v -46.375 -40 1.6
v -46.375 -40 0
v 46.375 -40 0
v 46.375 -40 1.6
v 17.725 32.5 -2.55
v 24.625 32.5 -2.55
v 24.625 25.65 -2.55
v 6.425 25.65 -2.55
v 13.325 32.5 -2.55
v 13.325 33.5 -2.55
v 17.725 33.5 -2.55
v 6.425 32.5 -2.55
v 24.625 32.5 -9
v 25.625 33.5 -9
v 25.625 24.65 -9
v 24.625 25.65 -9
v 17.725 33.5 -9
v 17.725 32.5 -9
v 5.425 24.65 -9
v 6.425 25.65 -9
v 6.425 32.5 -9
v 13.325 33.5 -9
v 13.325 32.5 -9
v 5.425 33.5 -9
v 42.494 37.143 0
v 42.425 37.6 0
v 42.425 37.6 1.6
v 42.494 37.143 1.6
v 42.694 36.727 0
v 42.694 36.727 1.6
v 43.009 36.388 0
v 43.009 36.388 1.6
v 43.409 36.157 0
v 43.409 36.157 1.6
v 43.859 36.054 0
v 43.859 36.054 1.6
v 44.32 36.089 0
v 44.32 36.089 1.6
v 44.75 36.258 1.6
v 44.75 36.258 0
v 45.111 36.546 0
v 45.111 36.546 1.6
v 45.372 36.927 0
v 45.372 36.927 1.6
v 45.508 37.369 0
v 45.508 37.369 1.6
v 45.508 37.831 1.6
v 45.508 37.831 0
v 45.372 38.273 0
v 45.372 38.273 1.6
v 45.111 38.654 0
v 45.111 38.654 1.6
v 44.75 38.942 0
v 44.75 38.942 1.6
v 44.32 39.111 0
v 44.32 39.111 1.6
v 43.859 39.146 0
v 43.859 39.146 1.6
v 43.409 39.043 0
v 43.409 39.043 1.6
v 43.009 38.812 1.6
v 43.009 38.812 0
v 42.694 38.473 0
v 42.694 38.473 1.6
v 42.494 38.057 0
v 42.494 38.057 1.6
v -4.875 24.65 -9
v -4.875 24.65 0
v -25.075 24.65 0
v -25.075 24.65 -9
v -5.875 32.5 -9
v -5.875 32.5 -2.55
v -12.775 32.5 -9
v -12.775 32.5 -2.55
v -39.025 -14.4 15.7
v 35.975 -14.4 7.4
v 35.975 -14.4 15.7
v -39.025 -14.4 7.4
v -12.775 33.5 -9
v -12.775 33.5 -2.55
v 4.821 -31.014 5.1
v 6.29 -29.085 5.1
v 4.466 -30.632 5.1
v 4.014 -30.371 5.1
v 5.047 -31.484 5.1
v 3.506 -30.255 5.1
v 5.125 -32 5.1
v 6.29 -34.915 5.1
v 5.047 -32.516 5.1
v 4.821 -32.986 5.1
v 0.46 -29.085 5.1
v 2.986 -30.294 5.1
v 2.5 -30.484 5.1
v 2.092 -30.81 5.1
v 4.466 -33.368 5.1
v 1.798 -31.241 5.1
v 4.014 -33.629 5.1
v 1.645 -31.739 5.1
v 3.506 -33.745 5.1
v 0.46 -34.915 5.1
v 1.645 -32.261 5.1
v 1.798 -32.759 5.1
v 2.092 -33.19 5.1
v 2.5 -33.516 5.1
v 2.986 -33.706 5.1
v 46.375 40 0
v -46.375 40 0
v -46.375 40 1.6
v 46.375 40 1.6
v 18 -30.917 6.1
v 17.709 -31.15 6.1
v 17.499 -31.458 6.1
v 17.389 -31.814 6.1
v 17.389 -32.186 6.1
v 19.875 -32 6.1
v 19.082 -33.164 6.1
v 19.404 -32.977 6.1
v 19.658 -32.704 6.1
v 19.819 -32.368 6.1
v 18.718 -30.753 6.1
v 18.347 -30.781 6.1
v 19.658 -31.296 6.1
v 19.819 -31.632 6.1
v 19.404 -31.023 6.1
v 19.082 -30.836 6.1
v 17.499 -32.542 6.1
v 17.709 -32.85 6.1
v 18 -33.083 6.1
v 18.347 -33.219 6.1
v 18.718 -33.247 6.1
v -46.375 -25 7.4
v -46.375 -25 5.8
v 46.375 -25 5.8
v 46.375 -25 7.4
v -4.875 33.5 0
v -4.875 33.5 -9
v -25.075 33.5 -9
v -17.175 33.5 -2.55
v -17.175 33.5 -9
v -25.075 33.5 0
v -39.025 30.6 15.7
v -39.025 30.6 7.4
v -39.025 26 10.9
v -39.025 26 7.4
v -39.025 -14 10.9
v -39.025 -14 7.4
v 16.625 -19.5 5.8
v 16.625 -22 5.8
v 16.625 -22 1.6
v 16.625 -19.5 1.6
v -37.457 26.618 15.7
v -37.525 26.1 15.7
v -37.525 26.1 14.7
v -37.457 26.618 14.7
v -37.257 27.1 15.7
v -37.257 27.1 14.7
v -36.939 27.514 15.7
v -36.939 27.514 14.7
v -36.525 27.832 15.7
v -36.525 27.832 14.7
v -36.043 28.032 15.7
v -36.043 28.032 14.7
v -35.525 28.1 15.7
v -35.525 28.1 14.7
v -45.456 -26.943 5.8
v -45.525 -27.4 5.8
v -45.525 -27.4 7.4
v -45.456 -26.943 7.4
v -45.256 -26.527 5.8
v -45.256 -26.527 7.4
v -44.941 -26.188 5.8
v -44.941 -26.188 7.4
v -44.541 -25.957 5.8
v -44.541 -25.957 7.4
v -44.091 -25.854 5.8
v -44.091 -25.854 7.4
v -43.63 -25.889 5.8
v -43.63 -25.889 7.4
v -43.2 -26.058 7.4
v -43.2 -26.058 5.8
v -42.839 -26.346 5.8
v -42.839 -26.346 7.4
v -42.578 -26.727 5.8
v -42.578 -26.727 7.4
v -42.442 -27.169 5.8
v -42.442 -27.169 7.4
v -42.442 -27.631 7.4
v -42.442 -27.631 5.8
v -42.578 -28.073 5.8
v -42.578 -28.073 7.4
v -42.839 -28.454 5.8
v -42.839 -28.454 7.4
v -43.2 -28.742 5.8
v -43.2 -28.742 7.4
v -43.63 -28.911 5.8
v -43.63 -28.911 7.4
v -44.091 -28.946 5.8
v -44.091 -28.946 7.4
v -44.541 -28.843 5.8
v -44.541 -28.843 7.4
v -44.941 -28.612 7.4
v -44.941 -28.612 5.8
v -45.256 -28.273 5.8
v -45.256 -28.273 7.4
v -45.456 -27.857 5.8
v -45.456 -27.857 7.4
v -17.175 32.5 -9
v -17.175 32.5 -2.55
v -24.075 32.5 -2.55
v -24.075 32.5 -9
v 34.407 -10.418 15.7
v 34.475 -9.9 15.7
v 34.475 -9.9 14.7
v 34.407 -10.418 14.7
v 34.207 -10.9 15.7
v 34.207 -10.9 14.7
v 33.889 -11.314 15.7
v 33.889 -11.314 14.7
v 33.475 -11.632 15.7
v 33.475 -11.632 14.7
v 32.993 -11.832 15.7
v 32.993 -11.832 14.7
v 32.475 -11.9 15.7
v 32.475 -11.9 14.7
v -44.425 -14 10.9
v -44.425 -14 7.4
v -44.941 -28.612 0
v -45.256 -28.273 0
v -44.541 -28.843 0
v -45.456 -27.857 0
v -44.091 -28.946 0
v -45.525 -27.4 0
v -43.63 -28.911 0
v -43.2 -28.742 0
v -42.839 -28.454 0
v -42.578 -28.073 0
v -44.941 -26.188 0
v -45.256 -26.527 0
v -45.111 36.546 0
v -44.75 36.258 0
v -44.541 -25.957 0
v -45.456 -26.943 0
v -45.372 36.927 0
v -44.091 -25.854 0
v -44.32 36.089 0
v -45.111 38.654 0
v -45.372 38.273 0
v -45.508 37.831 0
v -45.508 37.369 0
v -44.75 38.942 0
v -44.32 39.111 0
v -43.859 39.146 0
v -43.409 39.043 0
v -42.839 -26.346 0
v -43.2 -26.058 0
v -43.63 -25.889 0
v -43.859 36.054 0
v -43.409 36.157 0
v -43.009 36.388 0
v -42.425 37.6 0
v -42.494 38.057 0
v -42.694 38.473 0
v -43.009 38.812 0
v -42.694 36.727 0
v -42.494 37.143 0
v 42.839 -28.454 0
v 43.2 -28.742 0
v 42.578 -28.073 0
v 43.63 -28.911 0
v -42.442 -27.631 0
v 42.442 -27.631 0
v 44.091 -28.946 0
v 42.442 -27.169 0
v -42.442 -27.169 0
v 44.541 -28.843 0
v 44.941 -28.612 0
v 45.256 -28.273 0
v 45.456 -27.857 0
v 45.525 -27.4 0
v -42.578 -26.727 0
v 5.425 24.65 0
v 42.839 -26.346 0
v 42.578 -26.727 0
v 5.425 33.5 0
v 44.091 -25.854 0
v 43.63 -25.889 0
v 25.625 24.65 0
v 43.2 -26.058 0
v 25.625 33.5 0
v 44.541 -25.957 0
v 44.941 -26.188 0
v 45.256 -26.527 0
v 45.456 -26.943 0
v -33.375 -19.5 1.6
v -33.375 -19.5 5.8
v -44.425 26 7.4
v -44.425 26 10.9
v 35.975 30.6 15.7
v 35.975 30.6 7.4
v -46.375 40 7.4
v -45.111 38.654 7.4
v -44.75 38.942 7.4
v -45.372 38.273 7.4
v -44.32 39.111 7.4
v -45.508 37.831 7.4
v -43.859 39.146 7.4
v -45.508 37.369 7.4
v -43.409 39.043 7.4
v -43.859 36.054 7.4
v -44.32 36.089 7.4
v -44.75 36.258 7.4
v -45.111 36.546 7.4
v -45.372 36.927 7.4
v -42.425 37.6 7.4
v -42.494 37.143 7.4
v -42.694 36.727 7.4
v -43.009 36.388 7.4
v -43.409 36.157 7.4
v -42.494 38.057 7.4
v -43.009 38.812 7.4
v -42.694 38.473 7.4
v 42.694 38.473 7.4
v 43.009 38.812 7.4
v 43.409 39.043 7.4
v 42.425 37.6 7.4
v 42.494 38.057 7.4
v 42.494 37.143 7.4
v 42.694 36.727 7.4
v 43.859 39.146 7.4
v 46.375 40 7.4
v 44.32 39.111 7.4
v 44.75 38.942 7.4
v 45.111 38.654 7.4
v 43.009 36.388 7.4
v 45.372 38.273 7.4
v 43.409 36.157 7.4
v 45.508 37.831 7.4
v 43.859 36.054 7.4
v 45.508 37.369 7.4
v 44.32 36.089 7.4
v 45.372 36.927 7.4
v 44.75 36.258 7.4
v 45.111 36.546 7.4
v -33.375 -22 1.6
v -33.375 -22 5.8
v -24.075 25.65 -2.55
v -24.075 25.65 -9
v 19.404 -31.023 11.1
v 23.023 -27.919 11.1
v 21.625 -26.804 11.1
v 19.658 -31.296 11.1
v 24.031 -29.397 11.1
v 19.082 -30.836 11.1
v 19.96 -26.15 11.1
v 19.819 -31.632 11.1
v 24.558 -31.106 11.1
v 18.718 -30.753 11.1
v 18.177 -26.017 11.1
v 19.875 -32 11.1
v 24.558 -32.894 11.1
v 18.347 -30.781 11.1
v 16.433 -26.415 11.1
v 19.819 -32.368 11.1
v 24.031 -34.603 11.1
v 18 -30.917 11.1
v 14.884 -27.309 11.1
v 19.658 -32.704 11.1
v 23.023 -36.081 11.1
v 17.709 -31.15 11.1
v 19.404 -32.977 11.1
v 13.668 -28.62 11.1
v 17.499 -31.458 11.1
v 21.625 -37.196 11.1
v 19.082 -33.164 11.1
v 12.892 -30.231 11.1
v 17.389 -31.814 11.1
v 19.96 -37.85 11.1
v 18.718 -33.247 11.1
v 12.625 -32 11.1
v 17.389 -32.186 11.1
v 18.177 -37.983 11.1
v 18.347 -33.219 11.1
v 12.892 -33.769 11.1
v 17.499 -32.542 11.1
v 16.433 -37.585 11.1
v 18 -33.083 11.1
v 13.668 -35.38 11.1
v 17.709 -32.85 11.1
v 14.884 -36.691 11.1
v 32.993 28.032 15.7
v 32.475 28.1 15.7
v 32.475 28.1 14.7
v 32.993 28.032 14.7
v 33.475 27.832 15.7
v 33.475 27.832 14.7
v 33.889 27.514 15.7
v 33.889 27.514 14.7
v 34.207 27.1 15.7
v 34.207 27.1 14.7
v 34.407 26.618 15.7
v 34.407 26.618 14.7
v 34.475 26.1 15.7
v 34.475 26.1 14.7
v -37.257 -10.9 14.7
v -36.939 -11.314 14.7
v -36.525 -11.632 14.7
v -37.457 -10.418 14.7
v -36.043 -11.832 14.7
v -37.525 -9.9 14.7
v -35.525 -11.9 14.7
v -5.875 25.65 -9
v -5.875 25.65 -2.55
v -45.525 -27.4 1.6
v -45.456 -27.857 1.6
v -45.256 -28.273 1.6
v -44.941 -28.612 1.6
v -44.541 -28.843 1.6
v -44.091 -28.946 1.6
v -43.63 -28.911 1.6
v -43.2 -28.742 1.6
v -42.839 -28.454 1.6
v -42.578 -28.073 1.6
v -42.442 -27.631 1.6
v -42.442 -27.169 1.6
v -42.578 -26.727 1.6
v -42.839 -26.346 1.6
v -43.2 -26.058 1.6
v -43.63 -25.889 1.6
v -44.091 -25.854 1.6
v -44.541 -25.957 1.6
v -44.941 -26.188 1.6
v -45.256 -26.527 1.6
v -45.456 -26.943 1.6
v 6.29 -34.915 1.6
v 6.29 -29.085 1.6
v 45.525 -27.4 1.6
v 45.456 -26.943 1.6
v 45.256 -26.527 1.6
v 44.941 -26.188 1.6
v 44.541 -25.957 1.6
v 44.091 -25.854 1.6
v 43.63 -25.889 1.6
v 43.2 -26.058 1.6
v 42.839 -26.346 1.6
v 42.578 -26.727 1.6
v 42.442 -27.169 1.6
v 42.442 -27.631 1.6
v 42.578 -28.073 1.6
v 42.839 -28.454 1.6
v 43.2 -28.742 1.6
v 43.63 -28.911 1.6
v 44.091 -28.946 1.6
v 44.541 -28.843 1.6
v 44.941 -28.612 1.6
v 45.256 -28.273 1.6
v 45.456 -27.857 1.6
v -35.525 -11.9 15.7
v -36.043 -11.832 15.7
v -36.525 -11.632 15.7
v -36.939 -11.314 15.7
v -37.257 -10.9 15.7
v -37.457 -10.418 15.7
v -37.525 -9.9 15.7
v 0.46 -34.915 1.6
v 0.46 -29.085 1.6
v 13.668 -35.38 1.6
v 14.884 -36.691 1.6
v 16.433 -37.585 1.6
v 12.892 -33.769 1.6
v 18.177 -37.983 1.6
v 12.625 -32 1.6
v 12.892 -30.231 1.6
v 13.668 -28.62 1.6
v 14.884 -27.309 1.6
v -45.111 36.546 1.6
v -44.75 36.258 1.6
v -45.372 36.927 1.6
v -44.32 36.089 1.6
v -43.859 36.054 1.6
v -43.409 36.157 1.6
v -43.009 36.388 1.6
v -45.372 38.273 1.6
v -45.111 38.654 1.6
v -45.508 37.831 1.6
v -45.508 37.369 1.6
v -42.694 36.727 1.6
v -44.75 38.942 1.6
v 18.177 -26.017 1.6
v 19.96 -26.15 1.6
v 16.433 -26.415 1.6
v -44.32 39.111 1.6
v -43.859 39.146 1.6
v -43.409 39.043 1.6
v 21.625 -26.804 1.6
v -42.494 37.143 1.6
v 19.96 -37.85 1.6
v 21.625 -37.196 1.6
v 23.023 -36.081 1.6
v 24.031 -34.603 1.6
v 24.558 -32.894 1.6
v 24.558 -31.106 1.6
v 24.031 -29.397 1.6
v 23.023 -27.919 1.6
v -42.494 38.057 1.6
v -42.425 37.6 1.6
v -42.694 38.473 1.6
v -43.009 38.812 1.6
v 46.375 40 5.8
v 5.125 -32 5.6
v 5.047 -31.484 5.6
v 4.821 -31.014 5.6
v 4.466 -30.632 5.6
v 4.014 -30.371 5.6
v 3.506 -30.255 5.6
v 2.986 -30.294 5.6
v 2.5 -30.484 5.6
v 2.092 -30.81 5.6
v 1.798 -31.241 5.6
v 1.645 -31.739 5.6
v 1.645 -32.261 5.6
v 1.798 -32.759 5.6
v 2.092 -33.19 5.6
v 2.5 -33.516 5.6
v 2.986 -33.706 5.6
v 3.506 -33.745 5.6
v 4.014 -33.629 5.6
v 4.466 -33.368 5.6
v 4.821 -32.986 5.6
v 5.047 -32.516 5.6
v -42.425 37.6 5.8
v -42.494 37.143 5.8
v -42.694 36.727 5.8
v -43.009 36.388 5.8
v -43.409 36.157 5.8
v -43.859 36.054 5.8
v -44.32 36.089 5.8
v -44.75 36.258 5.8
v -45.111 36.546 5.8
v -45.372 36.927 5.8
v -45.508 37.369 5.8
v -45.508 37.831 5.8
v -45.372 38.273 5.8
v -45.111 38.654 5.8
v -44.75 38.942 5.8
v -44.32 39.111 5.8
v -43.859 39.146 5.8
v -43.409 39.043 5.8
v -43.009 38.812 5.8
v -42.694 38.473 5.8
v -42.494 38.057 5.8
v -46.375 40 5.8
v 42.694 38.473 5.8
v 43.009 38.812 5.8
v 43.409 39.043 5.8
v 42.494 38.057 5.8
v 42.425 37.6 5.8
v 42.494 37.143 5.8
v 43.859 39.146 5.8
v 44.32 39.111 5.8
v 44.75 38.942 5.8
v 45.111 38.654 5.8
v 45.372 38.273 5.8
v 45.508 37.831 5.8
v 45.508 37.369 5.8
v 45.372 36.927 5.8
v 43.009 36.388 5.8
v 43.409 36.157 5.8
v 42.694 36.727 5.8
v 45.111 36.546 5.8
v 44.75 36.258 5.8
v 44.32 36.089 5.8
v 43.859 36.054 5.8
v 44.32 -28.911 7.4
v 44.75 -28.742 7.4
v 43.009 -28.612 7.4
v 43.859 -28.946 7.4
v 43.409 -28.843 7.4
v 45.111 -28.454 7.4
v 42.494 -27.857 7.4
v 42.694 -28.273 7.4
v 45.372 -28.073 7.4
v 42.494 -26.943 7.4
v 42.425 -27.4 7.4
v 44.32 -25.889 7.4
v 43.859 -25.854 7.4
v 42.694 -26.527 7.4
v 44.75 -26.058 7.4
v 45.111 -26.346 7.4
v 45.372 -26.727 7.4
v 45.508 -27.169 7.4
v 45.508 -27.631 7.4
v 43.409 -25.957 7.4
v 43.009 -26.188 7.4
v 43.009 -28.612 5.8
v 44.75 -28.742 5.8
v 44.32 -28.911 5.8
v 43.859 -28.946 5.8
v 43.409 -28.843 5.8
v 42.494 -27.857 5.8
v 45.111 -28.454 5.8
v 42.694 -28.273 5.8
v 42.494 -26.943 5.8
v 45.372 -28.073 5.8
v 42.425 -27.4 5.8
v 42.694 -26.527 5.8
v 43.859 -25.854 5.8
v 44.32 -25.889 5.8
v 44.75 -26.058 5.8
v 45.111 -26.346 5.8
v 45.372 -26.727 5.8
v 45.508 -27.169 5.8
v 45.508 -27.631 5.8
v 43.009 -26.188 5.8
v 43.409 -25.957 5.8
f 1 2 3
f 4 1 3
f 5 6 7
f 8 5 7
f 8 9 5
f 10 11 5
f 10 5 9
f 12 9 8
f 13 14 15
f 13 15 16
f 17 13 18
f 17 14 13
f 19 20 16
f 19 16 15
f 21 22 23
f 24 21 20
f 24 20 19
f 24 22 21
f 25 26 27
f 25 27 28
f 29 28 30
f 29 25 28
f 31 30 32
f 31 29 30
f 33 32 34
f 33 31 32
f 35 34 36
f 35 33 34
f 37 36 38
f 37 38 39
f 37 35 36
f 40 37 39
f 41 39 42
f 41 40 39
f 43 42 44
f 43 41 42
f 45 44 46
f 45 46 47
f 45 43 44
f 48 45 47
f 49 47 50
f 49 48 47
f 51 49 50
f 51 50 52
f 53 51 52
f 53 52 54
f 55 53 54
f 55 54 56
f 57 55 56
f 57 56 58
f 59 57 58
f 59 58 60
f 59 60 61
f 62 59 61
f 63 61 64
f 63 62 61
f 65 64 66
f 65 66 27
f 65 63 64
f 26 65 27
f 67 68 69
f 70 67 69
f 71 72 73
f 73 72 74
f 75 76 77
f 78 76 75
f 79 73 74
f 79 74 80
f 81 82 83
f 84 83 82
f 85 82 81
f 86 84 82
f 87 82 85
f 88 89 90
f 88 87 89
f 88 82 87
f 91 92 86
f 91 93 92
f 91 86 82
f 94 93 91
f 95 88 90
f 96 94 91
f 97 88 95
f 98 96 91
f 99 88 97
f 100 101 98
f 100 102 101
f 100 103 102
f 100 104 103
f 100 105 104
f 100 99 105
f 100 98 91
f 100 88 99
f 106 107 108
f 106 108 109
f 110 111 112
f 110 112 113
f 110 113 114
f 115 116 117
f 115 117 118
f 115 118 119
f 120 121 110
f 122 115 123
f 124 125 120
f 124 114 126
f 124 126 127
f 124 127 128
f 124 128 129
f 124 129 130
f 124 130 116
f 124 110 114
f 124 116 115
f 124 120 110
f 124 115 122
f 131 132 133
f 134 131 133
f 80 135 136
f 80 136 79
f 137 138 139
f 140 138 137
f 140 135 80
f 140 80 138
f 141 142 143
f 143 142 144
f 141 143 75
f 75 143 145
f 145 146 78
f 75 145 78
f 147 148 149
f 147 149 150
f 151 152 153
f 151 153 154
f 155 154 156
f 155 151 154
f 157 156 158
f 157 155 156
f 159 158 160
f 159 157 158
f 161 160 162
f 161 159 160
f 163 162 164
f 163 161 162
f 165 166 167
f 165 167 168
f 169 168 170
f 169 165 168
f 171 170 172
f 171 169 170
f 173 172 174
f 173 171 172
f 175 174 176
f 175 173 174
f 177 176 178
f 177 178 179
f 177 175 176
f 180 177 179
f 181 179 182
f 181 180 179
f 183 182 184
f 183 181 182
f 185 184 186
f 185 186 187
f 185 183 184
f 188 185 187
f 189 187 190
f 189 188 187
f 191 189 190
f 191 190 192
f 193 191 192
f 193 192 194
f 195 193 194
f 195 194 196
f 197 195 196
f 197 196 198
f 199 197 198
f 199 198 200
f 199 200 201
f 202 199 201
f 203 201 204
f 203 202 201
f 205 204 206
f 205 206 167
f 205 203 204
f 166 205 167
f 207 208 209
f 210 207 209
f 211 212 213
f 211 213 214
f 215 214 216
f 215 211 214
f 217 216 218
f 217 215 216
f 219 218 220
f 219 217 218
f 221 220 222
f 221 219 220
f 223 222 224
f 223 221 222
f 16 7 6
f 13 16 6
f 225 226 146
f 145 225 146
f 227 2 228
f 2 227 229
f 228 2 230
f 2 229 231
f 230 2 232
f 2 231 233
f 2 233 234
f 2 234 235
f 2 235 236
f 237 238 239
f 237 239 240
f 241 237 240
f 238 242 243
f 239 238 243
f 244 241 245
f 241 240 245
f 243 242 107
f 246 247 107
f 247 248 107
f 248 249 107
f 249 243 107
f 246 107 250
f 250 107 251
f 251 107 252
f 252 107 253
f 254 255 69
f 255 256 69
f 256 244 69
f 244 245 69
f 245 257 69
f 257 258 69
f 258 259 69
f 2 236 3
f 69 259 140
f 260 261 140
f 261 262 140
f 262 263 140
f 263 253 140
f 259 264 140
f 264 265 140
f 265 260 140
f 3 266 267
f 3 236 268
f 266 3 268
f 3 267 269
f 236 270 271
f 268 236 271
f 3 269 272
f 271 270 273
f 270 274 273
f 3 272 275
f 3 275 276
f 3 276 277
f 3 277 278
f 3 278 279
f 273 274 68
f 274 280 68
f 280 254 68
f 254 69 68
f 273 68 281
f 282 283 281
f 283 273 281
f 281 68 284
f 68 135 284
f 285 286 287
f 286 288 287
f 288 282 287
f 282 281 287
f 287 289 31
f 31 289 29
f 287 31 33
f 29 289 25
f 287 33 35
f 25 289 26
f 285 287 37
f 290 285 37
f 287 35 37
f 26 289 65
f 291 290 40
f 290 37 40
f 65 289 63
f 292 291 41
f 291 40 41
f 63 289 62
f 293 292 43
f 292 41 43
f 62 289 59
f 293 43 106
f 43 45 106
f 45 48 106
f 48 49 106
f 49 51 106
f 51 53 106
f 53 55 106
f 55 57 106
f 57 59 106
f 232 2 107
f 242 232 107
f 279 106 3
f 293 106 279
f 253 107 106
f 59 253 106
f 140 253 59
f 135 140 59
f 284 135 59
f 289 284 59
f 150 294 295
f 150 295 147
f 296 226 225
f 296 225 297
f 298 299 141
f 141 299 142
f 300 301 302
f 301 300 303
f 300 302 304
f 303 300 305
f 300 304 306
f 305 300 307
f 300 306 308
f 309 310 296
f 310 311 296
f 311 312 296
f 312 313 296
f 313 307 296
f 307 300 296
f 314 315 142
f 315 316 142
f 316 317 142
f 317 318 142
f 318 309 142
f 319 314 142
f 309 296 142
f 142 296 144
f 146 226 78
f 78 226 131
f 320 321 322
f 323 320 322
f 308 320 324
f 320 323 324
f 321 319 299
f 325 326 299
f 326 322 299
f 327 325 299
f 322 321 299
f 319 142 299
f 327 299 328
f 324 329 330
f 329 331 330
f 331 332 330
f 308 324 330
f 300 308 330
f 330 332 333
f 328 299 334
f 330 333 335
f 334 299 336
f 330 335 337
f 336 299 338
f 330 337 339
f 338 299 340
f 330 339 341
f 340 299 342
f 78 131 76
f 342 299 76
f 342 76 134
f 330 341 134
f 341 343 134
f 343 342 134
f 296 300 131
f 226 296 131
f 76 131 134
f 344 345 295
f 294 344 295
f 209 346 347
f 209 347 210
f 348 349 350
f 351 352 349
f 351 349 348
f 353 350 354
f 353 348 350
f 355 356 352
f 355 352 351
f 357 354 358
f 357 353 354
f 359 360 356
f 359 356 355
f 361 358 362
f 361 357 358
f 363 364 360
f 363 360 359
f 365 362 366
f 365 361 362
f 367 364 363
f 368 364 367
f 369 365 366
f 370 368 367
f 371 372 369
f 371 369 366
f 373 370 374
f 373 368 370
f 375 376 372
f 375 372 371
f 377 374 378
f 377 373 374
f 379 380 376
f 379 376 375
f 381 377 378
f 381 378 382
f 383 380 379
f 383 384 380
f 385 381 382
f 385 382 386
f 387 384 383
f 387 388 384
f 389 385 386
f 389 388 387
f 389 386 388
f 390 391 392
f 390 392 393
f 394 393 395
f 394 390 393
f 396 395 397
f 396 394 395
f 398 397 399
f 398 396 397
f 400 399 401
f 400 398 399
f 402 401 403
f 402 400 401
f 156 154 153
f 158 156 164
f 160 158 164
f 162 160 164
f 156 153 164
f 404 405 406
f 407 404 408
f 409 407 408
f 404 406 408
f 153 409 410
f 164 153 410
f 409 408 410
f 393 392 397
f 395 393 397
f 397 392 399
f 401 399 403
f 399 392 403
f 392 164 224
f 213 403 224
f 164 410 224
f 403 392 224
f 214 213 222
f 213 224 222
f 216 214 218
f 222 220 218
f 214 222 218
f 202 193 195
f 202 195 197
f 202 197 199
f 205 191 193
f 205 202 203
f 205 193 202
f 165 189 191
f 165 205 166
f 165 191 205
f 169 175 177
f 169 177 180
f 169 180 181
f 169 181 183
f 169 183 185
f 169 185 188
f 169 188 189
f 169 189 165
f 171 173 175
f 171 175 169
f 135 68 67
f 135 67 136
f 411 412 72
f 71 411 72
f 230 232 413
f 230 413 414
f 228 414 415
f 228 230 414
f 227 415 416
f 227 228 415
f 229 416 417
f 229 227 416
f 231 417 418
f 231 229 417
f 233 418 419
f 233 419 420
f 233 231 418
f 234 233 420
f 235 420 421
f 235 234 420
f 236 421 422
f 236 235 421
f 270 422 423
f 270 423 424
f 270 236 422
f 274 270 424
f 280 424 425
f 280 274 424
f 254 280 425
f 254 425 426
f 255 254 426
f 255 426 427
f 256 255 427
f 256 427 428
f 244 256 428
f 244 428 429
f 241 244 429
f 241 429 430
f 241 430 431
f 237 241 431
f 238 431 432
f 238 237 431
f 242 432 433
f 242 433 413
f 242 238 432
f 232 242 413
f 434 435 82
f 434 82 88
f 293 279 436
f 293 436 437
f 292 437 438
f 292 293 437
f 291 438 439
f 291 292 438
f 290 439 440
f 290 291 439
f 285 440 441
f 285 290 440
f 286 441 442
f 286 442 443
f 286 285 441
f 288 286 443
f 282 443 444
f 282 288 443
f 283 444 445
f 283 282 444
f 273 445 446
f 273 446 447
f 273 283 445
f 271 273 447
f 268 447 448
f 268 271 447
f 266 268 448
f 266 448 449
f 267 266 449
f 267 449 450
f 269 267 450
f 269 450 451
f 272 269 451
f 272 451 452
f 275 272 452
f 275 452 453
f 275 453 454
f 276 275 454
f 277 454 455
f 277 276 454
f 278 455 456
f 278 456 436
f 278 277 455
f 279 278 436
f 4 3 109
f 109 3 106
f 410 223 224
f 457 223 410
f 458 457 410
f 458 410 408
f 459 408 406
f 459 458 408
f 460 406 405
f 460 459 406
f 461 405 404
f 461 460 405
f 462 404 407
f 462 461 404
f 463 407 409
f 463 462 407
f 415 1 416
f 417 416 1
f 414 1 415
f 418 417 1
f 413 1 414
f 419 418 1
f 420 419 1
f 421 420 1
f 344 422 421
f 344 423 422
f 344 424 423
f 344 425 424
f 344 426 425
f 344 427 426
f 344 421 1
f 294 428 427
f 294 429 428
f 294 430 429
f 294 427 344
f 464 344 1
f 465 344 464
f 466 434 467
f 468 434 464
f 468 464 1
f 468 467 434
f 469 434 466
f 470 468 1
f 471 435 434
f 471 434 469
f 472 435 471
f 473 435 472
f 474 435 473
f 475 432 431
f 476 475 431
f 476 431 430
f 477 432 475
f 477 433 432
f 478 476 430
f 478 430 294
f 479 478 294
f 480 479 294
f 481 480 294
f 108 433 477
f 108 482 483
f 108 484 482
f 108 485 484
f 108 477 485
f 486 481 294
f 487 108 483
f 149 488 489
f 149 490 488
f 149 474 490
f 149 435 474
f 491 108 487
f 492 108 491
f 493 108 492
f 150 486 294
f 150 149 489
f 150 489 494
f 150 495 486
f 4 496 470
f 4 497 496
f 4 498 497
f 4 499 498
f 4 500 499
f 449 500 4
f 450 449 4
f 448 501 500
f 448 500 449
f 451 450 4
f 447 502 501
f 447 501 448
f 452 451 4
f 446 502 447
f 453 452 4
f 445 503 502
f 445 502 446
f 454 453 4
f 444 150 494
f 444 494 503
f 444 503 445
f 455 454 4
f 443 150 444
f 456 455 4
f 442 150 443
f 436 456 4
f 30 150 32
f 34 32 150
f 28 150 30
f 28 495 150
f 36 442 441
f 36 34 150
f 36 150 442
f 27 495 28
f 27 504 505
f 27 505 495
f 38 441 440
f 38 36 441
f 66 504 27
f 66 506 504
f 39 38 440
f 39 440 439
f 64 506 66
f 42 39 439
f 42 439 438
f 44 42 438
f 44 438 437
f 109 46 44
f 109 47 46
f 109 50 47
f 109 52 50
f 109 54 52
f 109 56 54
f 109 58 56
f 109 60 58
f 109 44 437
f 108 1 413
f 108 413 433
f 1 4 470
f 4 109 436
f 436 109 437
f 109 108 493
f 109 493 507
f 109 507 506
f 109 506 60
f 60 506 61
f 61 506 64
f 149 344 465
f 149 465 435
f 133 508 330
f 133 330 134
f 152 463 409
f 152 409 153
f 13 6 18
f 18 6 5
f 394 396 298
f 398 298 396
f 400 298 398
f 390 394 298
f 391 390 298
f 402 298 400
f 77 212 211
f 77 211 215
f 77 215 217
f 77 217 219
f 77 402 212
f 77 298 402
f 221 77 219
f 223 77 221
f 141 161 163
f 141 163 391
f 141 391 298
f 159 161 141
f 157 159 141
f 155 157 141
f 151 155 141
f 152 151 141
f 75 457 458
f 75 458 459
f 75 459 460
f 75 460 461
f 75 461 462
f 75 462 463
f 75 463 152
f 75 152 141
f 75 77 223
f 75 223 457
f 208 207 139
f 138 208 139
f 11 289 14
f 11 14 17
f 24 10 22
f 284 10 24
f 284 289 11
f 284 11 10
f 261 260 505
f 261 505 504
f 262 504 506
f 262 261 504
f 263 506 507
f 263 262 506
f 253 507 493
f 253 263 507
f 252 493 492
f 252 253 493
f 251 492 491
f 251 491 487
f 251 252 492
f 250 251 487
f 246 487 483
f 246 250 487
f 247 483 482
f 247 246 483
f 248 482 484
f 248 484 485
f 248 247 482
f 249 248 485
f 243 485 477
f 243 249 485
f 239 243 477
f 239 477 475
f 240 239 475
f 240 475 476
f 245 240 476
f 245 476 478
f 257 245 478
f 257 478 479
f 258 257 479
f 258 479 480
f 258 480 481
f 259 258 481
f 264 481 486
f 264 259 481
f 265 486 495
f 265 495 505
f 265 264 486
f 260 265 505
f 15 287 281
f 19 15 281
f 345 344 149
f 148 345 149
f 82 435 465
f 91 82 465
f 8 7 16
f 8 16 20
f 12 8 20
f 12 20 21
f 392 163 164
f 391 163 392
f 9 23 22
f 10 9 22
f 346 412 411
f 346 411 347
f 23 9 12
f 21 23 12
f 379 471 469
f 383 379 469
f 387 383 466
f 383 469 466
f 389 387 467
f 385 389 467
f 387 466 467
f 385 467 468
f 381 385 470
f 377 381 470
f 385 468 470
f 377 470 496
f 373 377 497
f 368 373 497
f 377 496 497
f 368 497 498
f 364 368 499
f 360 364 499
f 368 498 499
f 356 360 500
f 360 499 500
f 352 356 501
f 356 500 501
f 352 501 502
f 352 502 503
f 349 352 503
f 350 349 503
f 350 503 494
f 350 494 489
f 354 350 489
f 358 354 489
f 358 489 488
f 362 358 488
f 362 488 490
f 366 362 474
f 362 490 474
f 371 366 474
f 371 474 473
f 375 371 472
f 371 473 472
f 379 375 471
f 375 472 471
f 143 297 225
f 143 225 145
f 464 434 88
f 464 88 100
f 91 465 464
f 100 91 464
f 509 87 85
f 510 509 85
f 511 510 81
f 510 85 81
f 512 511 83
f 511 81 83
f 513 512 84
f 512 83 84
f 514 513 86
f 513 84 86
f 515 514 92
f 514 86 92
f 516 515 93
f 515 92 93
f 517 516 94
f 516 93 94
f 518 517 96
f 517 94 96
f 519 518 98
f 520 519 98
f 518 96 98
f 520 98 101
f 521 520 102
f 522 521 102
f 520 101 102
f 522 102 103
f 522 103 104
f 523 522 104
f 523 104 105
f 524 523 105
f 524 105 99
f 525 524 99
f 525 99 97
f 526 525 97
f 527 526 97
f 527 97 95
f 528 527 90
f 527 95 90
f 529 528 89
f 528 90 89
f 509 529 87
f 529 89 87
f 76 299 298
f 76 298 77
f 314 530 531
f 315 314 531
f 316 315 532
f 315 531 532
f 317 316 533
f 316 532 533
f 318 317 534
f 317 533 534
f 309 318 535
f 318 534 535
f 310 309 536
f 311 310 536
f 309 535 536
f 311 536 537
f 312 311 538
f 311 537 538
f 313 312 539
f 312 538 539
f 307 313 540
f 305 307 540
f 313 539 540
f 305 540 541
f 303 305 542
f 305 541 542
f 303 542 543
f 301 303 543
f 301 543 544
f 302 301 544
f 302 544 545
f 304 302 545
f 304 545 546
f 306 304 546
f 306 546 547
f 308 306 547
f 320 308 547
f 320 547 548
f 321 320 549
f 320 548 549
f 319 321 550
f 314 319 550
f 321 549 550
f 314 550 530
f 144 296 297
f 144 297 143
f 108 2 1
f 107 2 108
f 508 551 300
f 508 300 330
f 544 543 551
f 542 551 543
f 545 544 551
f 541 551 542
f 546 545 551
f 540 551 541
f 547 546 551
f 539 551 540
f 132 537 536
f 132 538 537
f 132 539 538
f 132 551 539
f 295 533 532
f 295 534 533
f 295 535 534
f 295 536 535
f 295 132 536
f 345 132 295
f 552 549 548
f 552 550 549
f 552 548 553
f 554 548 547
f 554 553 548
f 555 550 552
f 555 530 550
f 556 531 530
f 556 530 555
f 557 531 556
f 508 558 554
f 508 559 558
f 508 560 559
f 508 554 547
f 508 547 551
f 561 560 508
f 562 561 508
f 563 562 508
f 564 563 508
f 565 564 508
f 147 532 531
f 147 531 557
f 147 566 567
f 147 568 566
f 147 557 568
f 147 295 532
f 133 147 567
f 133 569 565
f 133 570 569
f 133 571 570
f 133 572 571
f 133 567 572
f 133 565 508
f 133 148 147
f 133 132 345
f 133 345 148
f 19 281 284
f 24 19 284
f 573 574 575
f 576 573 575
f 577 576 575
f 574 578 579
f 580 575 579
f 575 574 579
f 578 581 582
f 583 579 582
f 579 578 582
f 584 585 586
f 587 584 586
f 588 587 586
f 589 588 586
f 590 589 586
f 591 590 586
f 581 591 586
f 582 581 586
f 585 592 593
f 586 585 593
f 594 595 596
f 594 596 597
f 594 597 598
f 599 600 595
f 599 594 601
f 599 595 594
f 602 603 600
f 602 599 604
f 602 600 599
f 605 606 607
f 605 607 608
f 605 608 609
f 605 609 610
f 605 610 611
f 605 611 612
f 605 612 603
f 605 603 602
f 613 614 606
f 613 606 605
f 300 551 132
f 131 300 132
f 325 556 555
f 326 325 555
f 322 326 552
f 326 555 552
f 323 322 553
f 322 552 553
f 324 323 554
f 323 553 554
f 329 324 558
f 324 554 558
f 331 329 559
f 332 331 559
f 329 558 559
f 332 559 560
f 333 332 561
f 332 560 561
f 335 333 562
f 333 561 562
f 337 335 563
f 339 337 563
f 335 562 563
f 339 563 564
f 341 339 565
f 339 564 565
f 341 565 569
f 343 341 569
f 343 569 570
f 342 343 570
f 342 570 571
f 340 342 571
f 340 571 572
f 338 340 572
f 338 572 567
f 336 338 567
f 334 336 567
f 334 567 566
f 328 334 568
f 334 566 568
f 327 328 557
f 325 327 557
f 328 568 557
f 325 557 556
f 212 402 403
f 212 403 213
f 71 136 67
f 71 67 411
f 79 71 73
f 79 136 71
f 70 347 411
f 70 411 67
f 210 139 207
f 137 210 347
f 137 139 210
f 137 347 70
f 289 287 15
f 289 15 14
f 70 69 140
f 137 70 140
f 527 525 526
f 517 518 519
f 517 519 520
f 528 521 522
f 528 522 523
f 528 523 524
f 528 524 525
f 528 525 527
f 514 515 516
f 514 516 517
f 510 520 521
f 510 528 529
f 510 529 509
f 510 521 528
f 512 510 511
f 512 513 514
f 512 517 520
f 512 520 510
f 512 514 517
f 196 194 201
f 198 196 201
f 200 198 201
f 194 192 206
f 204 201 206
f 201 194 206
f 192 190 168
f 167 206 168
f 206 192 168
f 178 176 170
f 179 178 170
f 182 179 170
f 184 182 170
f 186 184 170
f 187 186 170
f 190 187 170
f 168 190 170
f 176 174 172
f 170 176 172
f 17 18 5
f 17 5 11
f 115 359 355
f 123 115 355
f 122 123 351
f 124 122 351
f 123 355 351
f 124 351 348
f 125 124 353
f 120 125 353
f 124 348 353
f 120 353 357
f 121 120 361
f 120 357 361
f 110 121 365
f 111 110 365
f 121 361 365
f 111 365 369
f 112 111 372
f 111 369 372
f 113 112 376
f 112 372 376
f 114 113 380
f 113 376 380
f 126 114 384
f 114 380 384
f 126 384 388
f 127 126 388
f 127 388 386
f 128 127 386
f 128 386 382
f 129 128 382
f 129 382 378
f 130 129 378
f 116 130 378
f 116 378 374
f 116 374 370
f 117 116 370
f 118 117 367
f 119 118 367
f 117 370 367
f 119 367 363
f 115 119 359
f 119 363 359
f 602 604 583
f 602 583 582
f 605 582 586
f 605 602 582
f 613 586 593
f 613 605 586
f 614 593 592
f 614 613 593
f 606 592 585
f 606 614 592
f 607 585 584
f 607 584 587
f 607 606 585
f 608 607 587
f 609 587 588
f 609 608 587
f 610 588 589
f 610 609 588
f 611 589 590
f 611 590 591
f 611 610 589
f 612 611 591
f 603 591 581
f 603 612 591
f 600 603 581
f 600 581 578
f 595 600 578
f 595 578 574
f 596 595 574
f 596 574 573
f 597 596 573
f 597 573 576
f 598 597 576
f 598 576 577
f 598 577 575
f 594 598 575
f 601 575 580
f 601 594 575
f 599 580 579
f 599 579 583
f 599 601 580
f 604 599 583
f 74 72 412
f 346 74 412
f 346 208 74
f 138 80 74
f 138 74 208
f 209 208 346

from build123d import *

# Parameters (mm, degrees)
SKETCH1_W                             = 92.75
SKETCH1_H                             = 80
SKETCH1_R                             = 1.55
BOSS_EXTRUDE1_FIRST_PCB_DEPTH         = 1.6
SKETCH2_R                             = 6
BOSS_EXTRUDE2_SPEAKER_DEPTH           = 9.5
SKETCH15_R                            = 1.25
CUT_EXTRUDE1_SPEAKER_HOLE_DEPTH       = 5
SKETCH4_W                             = 5.83
SKETCH4_H                             = 5.83
BOSS_EXTRUDE4_RESET_SWITCH_DEPTH      = 3.5
SKETCH5_R                             = 1.75
BOSS_EXTRUDE5_RESET_BUTTON_DEPTH      = 0.5
SKETCH19_W                            = 50
SKETCH19_H                            = 2.5
BOSS_EXTRUDE10_CONNECTOR_DEPTH        = 4.2
SKETCH11_R                            = 1.55
SKETCH11_W                            = 92.75
SKETCH11_H                            = 65
BOSS_EXTRUDE11_UPPER_PCB_DEPTH        = 1.6
SKETCH12_W                            = 75
SKETCH12_H                            = 45
BOSS_EXTRUDE12_LCD_DEPTH              = 8.3
SKETCH24_W                            = 5.4
SKETCH24_H                            = 40
BOSS_EXTRUDE13_LCD_BUMPOUT_DEPTH      = 3.5
CUT_EXTRUDE2_SCREEN_RECESS_DEPTH      = 1
SKETCH21_W                            = 20.2
SKETCH21_H                            = 8.85
SKETCH21_W_2                          = 18.2
SKETCH21_H_2                          = 6.85
BOSS_EXTRUDE14_CONNECTORS_DEPTH       = 9
SKETCH22_W                            = 18.2
SKETCH22_H                            = 6.85
BOSS_EXTRUDE15_CONNECTOR_RECESS_DEPTH = 2.55
SKETCH23_W                            = 4.4
SKETCH23_H                            = 1
CUT_EXTRUDE3_CONNECTOR_NOTCH_DEPTH    = 6.45


with BuildPart() as part:
    # Sketch1 → Boss-Extrude1 - First PCB (new body)
    with BuildSketch(Plane.XY):
        Rectangle(SKETCH1_W, SKETCH1_H)
        with Locations((-43.975, 37.6)):
            Circle(SKETCH1_R, mode=Mode.SUBTRACT)
        with Locations(Location((43.975, 37.6, 0), (0, 0, 180))):
            Circle(SKETCH1_R, mode=Mode.SUBTRACT)
        with Locations((43.975, -27.4)):
            Circle(SKETCH1_R, mode=Mode.SUBTRACT)
        with Locations(Location((-43.975, -27.4, 0), (0, 0, 180))):
            Circle(SKETCH1_R, mode=Mode.SUBTRACT)
    extrude(amount=BOSS_EXTRUDE1_FIRST_PCB_DEPTH)

    # Sketch2 → Boss-Extrude2 - Speaker (add)
    with BuildSketch(Plane.XY.offset(1.6)):
        with Locations(Location((18.625, -32, 0), (0, 0, 180))):
            Circle(SKETCH2_R)
    extrude(amount=BOSS_EXTRUDE2_SPEAKER_DEPTH)

    # Sketch15 → Cut-Extrude1 - Speaker Hole (cut)
    with BuildSketch(Plane.XY.offset(11.1)):
        with Locations((18.625, -32)):
            Circle(SKETCH15_R)
    extrude(amount=-CUT_EXTRUDE1_SPEAKER_HOLE_DEPTH, mode=Mode.SUBTRACT)

    # Sketch4 → Boss-Extrude4 - Reset Switch (add)
    with BuildSketch(Plane(origin=(0, 0, 1.6), x_dir=(-1, 0, 0), z_dir=(0, 0, 1))):
        with Locations((-3.375, 32)):
            Rectangle(SKETCH4_W, SKETCH4_H)
    extrude(amount=BOSS_EXTRUDE4_RESET_SWITCH_DEPTH)

    # Sketch5 → Boss-Extrude5 - Reset Button (add)
    with BuildSketch(Plane(origin=(0, 0, 5.1), x_dir=(-1, 0, 0), z_dir=(0, 0, 1))):
        with Locations(Location((-3.375, 32, 0), (0, 0, 180))):
            Circle(SKETCH5_R)
    extrude(amount=BOSS_EXTRUDE5_RESET_BUTTON_DEPTH)

    # Sketch19 → Boss-Extrude10 - Connector (add)
    with BuildSketch(Plane.XY.offset(1.6)):
        with Locations((-8.375, -20.75)):
            Rectangle(SKETCH19_W, SKETCH19_H)
    extrude(amount=BOSS_EXTRUDE10_CONNECTOR_DEPTH)

    # Sketch11 → Boss-Extrude11 - Upper PCB (add)
    # profile 1 of 3: a face of its own
    with BuildSketch(Plane(origin=(0, -2, 5.8), x_dir=(1, 0, 0), z_dir=(0, 0, -1))):
        with Locations(Location((-43.975, 25.4, 0), (0, 0, 180))):
            Circle(SKETCH11_R)
    # profile 2 of 3: a face of its own
    with BuildSketch(Plane(origin=(0, -2, 5.8), x_dir=(1, 0, 0), z_dir=(0, 0, -1))):
        with Locations(Location((43.975, 25.4, 0), (0, 0, 180))):
            Circle(SKETCH11_R)
    # profile 3 of 3: a face of its own
    with BuildSketch(Plane(origin=(0, -2, 5.8), x_dir=(1, 0, 0), z_dir=(0, 0, -1))):
        with Locations((0, -9.5)):
            Rectangle(SKETCH11_W, SKETCH11_H)
        with Locations((-43.975, -39.6)):
            Circle(SKETCH11_R, mode=Mode.SUBTRACT)
        with Locations(Location((43.975, -39.6, 0), (0, 0, 180))):
            Circle(SKETCH11_R, mode=Mode.SUBTRACT)
    extrude(amount=-BOSS_EXTRUDE11_UPPER_PCB_DEPTH)


with BuildPart() as boss_extrude11_upper_pcb_piece_1:
    # of the separate pieces the step leaves, piece 1, a body of its own (boss_extrude11_upper_pcb_pieces)
    add(part.part.solids().sort_by_distance((46.375, -25, 5.8))[0])

    # Sketch12 → Boss-Extrude12 - LCD (add)
    with BuildSketch(Plane(origin=(0, 0, 7.4), x_dir=(-1, 0, 0), z_dir=(0, 0, 1))):
        with Locations((1.525, -8.1)):
            Rectangle(SKETCH12_W, SKETCH12_H)
    extrude(amount=BOSS_EXTRUDE12_LCD_DEPTH)

    # Sketch24 → Boss-Extrude13 - LCD Bumpout (add)
    with BuildSketch(Plane.XY.offset(7.4)):
        with Locations((-41.725, 6)):
            Rectangle(SKETCH24_W, SKETCH24_H)
    extrude(amount=BOSS_EXTRUDE13_LCD_BUMPOUT_DEPTH)

    # Sketch13 → Cut-Extrude2 - Screen Recess (cut)
    with BuildSketch(Plane(origin=(0, 0, 15.7), x_dir=(-1, 0, 0), z_dir=(0, 0, 1))):
        with BuildLine():
            Line((-32.475, 11.9), (35.525, 11.9))
            ThreePointArc((35.525, 11.9), (36.939213562, 11.314213562), (37.525, 9.9))
            Line((37.525, 9.9), (37.525, -26.1))
            ThreePointArc((37.525, -26.1), (36.939213562, -27.514213562), (35.525, -28.1))
            Line((35.525, -28.1), (-32.475, -28.1))
            ThreePointArc((-32.475, -28.1), (-33.889213562, -27.514213562), (-34.475, -26.1))
            Line((-34.475, -26.1), (-34.475, 9.9))
            ThreePointArc((-34.475, 9.9), (-33.889213562, 11.314213562), (-32.475, 11.9))
        make_face()
    extrude(amount=-CUT_EXTRUDE2_SCREEN_RECESS_DEPTH, mode=Mode.SUBTRACT)

    # Sketch21 → Boss-Extrude14 - Connectors (add)
    # profile 1 of 2: a face of its own
    with BuildSketch(Plane(origin=(0, 0, 0), x_dir=(-1, 0, 0), z_dir=(0, 0, -1))):
        with Locations((-15.525, 29.075)):
            Rectangle(SKETCH21_W, SKETCH21_H)
        with Locations((-15.525, 29.075)):
            Rectangle(SKETCH21_W_2, SKETCH21_H_2, mode=Mode.SUBTRACT)
    # profile 2 of 2: a face of its own
    with BuildSketch(Plane(origin=(0, 0, 0), x_dir=(-1, 0, 0), z_dir=(0, 0, -1))):
        with Locations((14.975, 29.075)):
            Rectangle(SKETCH21_W, SKETCH21_H)
        with Locations((14.975, 29.075)):
            Rectangle(SKETCH21_W_2, SKETCH21_H_2, mode=Mode.SUBTRACT)
    extrude(amount=BOSS_EXTRUDE14_CONNECTORS_DEPTH)

    # Sketch22 → Boss-Extrude15 - Connector Recess (add)
    with BuildSketch(Plane(origin=(0, 0, 0), x_dir=(-1, 0, 0), z_dir=(0, 0, -1))):
        with Locations((-15.525, 29.075)):
            Rectangle(SKETCH22_W, SKETCH22_H)
        with Locations((14.975, 29.075)):
            Rectangle(SKETCH22_W, SKETCH22_H)
    extrude(amount=BOSS_EXTRUDE15_CONNECTOR_RECESS_DEPTH)

    # Sketch23 → Cut-Extrude3 - Connector Notch (cut)
    with BuildSketch(Plane(origin=(0, 0, -9), x_dir=(-1, 0, 0), z_dir=(0, 0, -1))):
        with Locations((-15.525, 33)):
            Rectangle(SKETCH23_W, SKETCH23_H)
        with Locations((14.975, 33)):
            Rectangle(SKETCH23_W, SKETCH23_H)
    extrude(amount=-CUT_EXTRUDE3_CONNECTOR_NOTCH_DEPTH, mode=Mode.SUBTRACT)


with BuildPart() as boss_extrude11_upper_pcb_piece_2:
    # of the separate pieces the step leaves, piece 2, a body of its own (boss_extrude11_upper_pcb_pieces)
    add(part.part.solids().sort_by_distance((-45.525, -27.4, 5.8))[0])


with BuildPart() as boss_extrude11_upper_pcb_piece_3:
    # of the separate pieces the step leaves, piece 3, a body of its own (boss_extrude11_upper_pcb_pieces)
    add(part.part.solids().sort_by_distance((42.425, -27.4, 5.8))[0])


solid = Compound([boss_extrude11_upper_pcb_piece_1.part, boss_extrude11_upper_pcb_piece_2.part, boss_extrude11_upper_pcb_piece_3.part])
